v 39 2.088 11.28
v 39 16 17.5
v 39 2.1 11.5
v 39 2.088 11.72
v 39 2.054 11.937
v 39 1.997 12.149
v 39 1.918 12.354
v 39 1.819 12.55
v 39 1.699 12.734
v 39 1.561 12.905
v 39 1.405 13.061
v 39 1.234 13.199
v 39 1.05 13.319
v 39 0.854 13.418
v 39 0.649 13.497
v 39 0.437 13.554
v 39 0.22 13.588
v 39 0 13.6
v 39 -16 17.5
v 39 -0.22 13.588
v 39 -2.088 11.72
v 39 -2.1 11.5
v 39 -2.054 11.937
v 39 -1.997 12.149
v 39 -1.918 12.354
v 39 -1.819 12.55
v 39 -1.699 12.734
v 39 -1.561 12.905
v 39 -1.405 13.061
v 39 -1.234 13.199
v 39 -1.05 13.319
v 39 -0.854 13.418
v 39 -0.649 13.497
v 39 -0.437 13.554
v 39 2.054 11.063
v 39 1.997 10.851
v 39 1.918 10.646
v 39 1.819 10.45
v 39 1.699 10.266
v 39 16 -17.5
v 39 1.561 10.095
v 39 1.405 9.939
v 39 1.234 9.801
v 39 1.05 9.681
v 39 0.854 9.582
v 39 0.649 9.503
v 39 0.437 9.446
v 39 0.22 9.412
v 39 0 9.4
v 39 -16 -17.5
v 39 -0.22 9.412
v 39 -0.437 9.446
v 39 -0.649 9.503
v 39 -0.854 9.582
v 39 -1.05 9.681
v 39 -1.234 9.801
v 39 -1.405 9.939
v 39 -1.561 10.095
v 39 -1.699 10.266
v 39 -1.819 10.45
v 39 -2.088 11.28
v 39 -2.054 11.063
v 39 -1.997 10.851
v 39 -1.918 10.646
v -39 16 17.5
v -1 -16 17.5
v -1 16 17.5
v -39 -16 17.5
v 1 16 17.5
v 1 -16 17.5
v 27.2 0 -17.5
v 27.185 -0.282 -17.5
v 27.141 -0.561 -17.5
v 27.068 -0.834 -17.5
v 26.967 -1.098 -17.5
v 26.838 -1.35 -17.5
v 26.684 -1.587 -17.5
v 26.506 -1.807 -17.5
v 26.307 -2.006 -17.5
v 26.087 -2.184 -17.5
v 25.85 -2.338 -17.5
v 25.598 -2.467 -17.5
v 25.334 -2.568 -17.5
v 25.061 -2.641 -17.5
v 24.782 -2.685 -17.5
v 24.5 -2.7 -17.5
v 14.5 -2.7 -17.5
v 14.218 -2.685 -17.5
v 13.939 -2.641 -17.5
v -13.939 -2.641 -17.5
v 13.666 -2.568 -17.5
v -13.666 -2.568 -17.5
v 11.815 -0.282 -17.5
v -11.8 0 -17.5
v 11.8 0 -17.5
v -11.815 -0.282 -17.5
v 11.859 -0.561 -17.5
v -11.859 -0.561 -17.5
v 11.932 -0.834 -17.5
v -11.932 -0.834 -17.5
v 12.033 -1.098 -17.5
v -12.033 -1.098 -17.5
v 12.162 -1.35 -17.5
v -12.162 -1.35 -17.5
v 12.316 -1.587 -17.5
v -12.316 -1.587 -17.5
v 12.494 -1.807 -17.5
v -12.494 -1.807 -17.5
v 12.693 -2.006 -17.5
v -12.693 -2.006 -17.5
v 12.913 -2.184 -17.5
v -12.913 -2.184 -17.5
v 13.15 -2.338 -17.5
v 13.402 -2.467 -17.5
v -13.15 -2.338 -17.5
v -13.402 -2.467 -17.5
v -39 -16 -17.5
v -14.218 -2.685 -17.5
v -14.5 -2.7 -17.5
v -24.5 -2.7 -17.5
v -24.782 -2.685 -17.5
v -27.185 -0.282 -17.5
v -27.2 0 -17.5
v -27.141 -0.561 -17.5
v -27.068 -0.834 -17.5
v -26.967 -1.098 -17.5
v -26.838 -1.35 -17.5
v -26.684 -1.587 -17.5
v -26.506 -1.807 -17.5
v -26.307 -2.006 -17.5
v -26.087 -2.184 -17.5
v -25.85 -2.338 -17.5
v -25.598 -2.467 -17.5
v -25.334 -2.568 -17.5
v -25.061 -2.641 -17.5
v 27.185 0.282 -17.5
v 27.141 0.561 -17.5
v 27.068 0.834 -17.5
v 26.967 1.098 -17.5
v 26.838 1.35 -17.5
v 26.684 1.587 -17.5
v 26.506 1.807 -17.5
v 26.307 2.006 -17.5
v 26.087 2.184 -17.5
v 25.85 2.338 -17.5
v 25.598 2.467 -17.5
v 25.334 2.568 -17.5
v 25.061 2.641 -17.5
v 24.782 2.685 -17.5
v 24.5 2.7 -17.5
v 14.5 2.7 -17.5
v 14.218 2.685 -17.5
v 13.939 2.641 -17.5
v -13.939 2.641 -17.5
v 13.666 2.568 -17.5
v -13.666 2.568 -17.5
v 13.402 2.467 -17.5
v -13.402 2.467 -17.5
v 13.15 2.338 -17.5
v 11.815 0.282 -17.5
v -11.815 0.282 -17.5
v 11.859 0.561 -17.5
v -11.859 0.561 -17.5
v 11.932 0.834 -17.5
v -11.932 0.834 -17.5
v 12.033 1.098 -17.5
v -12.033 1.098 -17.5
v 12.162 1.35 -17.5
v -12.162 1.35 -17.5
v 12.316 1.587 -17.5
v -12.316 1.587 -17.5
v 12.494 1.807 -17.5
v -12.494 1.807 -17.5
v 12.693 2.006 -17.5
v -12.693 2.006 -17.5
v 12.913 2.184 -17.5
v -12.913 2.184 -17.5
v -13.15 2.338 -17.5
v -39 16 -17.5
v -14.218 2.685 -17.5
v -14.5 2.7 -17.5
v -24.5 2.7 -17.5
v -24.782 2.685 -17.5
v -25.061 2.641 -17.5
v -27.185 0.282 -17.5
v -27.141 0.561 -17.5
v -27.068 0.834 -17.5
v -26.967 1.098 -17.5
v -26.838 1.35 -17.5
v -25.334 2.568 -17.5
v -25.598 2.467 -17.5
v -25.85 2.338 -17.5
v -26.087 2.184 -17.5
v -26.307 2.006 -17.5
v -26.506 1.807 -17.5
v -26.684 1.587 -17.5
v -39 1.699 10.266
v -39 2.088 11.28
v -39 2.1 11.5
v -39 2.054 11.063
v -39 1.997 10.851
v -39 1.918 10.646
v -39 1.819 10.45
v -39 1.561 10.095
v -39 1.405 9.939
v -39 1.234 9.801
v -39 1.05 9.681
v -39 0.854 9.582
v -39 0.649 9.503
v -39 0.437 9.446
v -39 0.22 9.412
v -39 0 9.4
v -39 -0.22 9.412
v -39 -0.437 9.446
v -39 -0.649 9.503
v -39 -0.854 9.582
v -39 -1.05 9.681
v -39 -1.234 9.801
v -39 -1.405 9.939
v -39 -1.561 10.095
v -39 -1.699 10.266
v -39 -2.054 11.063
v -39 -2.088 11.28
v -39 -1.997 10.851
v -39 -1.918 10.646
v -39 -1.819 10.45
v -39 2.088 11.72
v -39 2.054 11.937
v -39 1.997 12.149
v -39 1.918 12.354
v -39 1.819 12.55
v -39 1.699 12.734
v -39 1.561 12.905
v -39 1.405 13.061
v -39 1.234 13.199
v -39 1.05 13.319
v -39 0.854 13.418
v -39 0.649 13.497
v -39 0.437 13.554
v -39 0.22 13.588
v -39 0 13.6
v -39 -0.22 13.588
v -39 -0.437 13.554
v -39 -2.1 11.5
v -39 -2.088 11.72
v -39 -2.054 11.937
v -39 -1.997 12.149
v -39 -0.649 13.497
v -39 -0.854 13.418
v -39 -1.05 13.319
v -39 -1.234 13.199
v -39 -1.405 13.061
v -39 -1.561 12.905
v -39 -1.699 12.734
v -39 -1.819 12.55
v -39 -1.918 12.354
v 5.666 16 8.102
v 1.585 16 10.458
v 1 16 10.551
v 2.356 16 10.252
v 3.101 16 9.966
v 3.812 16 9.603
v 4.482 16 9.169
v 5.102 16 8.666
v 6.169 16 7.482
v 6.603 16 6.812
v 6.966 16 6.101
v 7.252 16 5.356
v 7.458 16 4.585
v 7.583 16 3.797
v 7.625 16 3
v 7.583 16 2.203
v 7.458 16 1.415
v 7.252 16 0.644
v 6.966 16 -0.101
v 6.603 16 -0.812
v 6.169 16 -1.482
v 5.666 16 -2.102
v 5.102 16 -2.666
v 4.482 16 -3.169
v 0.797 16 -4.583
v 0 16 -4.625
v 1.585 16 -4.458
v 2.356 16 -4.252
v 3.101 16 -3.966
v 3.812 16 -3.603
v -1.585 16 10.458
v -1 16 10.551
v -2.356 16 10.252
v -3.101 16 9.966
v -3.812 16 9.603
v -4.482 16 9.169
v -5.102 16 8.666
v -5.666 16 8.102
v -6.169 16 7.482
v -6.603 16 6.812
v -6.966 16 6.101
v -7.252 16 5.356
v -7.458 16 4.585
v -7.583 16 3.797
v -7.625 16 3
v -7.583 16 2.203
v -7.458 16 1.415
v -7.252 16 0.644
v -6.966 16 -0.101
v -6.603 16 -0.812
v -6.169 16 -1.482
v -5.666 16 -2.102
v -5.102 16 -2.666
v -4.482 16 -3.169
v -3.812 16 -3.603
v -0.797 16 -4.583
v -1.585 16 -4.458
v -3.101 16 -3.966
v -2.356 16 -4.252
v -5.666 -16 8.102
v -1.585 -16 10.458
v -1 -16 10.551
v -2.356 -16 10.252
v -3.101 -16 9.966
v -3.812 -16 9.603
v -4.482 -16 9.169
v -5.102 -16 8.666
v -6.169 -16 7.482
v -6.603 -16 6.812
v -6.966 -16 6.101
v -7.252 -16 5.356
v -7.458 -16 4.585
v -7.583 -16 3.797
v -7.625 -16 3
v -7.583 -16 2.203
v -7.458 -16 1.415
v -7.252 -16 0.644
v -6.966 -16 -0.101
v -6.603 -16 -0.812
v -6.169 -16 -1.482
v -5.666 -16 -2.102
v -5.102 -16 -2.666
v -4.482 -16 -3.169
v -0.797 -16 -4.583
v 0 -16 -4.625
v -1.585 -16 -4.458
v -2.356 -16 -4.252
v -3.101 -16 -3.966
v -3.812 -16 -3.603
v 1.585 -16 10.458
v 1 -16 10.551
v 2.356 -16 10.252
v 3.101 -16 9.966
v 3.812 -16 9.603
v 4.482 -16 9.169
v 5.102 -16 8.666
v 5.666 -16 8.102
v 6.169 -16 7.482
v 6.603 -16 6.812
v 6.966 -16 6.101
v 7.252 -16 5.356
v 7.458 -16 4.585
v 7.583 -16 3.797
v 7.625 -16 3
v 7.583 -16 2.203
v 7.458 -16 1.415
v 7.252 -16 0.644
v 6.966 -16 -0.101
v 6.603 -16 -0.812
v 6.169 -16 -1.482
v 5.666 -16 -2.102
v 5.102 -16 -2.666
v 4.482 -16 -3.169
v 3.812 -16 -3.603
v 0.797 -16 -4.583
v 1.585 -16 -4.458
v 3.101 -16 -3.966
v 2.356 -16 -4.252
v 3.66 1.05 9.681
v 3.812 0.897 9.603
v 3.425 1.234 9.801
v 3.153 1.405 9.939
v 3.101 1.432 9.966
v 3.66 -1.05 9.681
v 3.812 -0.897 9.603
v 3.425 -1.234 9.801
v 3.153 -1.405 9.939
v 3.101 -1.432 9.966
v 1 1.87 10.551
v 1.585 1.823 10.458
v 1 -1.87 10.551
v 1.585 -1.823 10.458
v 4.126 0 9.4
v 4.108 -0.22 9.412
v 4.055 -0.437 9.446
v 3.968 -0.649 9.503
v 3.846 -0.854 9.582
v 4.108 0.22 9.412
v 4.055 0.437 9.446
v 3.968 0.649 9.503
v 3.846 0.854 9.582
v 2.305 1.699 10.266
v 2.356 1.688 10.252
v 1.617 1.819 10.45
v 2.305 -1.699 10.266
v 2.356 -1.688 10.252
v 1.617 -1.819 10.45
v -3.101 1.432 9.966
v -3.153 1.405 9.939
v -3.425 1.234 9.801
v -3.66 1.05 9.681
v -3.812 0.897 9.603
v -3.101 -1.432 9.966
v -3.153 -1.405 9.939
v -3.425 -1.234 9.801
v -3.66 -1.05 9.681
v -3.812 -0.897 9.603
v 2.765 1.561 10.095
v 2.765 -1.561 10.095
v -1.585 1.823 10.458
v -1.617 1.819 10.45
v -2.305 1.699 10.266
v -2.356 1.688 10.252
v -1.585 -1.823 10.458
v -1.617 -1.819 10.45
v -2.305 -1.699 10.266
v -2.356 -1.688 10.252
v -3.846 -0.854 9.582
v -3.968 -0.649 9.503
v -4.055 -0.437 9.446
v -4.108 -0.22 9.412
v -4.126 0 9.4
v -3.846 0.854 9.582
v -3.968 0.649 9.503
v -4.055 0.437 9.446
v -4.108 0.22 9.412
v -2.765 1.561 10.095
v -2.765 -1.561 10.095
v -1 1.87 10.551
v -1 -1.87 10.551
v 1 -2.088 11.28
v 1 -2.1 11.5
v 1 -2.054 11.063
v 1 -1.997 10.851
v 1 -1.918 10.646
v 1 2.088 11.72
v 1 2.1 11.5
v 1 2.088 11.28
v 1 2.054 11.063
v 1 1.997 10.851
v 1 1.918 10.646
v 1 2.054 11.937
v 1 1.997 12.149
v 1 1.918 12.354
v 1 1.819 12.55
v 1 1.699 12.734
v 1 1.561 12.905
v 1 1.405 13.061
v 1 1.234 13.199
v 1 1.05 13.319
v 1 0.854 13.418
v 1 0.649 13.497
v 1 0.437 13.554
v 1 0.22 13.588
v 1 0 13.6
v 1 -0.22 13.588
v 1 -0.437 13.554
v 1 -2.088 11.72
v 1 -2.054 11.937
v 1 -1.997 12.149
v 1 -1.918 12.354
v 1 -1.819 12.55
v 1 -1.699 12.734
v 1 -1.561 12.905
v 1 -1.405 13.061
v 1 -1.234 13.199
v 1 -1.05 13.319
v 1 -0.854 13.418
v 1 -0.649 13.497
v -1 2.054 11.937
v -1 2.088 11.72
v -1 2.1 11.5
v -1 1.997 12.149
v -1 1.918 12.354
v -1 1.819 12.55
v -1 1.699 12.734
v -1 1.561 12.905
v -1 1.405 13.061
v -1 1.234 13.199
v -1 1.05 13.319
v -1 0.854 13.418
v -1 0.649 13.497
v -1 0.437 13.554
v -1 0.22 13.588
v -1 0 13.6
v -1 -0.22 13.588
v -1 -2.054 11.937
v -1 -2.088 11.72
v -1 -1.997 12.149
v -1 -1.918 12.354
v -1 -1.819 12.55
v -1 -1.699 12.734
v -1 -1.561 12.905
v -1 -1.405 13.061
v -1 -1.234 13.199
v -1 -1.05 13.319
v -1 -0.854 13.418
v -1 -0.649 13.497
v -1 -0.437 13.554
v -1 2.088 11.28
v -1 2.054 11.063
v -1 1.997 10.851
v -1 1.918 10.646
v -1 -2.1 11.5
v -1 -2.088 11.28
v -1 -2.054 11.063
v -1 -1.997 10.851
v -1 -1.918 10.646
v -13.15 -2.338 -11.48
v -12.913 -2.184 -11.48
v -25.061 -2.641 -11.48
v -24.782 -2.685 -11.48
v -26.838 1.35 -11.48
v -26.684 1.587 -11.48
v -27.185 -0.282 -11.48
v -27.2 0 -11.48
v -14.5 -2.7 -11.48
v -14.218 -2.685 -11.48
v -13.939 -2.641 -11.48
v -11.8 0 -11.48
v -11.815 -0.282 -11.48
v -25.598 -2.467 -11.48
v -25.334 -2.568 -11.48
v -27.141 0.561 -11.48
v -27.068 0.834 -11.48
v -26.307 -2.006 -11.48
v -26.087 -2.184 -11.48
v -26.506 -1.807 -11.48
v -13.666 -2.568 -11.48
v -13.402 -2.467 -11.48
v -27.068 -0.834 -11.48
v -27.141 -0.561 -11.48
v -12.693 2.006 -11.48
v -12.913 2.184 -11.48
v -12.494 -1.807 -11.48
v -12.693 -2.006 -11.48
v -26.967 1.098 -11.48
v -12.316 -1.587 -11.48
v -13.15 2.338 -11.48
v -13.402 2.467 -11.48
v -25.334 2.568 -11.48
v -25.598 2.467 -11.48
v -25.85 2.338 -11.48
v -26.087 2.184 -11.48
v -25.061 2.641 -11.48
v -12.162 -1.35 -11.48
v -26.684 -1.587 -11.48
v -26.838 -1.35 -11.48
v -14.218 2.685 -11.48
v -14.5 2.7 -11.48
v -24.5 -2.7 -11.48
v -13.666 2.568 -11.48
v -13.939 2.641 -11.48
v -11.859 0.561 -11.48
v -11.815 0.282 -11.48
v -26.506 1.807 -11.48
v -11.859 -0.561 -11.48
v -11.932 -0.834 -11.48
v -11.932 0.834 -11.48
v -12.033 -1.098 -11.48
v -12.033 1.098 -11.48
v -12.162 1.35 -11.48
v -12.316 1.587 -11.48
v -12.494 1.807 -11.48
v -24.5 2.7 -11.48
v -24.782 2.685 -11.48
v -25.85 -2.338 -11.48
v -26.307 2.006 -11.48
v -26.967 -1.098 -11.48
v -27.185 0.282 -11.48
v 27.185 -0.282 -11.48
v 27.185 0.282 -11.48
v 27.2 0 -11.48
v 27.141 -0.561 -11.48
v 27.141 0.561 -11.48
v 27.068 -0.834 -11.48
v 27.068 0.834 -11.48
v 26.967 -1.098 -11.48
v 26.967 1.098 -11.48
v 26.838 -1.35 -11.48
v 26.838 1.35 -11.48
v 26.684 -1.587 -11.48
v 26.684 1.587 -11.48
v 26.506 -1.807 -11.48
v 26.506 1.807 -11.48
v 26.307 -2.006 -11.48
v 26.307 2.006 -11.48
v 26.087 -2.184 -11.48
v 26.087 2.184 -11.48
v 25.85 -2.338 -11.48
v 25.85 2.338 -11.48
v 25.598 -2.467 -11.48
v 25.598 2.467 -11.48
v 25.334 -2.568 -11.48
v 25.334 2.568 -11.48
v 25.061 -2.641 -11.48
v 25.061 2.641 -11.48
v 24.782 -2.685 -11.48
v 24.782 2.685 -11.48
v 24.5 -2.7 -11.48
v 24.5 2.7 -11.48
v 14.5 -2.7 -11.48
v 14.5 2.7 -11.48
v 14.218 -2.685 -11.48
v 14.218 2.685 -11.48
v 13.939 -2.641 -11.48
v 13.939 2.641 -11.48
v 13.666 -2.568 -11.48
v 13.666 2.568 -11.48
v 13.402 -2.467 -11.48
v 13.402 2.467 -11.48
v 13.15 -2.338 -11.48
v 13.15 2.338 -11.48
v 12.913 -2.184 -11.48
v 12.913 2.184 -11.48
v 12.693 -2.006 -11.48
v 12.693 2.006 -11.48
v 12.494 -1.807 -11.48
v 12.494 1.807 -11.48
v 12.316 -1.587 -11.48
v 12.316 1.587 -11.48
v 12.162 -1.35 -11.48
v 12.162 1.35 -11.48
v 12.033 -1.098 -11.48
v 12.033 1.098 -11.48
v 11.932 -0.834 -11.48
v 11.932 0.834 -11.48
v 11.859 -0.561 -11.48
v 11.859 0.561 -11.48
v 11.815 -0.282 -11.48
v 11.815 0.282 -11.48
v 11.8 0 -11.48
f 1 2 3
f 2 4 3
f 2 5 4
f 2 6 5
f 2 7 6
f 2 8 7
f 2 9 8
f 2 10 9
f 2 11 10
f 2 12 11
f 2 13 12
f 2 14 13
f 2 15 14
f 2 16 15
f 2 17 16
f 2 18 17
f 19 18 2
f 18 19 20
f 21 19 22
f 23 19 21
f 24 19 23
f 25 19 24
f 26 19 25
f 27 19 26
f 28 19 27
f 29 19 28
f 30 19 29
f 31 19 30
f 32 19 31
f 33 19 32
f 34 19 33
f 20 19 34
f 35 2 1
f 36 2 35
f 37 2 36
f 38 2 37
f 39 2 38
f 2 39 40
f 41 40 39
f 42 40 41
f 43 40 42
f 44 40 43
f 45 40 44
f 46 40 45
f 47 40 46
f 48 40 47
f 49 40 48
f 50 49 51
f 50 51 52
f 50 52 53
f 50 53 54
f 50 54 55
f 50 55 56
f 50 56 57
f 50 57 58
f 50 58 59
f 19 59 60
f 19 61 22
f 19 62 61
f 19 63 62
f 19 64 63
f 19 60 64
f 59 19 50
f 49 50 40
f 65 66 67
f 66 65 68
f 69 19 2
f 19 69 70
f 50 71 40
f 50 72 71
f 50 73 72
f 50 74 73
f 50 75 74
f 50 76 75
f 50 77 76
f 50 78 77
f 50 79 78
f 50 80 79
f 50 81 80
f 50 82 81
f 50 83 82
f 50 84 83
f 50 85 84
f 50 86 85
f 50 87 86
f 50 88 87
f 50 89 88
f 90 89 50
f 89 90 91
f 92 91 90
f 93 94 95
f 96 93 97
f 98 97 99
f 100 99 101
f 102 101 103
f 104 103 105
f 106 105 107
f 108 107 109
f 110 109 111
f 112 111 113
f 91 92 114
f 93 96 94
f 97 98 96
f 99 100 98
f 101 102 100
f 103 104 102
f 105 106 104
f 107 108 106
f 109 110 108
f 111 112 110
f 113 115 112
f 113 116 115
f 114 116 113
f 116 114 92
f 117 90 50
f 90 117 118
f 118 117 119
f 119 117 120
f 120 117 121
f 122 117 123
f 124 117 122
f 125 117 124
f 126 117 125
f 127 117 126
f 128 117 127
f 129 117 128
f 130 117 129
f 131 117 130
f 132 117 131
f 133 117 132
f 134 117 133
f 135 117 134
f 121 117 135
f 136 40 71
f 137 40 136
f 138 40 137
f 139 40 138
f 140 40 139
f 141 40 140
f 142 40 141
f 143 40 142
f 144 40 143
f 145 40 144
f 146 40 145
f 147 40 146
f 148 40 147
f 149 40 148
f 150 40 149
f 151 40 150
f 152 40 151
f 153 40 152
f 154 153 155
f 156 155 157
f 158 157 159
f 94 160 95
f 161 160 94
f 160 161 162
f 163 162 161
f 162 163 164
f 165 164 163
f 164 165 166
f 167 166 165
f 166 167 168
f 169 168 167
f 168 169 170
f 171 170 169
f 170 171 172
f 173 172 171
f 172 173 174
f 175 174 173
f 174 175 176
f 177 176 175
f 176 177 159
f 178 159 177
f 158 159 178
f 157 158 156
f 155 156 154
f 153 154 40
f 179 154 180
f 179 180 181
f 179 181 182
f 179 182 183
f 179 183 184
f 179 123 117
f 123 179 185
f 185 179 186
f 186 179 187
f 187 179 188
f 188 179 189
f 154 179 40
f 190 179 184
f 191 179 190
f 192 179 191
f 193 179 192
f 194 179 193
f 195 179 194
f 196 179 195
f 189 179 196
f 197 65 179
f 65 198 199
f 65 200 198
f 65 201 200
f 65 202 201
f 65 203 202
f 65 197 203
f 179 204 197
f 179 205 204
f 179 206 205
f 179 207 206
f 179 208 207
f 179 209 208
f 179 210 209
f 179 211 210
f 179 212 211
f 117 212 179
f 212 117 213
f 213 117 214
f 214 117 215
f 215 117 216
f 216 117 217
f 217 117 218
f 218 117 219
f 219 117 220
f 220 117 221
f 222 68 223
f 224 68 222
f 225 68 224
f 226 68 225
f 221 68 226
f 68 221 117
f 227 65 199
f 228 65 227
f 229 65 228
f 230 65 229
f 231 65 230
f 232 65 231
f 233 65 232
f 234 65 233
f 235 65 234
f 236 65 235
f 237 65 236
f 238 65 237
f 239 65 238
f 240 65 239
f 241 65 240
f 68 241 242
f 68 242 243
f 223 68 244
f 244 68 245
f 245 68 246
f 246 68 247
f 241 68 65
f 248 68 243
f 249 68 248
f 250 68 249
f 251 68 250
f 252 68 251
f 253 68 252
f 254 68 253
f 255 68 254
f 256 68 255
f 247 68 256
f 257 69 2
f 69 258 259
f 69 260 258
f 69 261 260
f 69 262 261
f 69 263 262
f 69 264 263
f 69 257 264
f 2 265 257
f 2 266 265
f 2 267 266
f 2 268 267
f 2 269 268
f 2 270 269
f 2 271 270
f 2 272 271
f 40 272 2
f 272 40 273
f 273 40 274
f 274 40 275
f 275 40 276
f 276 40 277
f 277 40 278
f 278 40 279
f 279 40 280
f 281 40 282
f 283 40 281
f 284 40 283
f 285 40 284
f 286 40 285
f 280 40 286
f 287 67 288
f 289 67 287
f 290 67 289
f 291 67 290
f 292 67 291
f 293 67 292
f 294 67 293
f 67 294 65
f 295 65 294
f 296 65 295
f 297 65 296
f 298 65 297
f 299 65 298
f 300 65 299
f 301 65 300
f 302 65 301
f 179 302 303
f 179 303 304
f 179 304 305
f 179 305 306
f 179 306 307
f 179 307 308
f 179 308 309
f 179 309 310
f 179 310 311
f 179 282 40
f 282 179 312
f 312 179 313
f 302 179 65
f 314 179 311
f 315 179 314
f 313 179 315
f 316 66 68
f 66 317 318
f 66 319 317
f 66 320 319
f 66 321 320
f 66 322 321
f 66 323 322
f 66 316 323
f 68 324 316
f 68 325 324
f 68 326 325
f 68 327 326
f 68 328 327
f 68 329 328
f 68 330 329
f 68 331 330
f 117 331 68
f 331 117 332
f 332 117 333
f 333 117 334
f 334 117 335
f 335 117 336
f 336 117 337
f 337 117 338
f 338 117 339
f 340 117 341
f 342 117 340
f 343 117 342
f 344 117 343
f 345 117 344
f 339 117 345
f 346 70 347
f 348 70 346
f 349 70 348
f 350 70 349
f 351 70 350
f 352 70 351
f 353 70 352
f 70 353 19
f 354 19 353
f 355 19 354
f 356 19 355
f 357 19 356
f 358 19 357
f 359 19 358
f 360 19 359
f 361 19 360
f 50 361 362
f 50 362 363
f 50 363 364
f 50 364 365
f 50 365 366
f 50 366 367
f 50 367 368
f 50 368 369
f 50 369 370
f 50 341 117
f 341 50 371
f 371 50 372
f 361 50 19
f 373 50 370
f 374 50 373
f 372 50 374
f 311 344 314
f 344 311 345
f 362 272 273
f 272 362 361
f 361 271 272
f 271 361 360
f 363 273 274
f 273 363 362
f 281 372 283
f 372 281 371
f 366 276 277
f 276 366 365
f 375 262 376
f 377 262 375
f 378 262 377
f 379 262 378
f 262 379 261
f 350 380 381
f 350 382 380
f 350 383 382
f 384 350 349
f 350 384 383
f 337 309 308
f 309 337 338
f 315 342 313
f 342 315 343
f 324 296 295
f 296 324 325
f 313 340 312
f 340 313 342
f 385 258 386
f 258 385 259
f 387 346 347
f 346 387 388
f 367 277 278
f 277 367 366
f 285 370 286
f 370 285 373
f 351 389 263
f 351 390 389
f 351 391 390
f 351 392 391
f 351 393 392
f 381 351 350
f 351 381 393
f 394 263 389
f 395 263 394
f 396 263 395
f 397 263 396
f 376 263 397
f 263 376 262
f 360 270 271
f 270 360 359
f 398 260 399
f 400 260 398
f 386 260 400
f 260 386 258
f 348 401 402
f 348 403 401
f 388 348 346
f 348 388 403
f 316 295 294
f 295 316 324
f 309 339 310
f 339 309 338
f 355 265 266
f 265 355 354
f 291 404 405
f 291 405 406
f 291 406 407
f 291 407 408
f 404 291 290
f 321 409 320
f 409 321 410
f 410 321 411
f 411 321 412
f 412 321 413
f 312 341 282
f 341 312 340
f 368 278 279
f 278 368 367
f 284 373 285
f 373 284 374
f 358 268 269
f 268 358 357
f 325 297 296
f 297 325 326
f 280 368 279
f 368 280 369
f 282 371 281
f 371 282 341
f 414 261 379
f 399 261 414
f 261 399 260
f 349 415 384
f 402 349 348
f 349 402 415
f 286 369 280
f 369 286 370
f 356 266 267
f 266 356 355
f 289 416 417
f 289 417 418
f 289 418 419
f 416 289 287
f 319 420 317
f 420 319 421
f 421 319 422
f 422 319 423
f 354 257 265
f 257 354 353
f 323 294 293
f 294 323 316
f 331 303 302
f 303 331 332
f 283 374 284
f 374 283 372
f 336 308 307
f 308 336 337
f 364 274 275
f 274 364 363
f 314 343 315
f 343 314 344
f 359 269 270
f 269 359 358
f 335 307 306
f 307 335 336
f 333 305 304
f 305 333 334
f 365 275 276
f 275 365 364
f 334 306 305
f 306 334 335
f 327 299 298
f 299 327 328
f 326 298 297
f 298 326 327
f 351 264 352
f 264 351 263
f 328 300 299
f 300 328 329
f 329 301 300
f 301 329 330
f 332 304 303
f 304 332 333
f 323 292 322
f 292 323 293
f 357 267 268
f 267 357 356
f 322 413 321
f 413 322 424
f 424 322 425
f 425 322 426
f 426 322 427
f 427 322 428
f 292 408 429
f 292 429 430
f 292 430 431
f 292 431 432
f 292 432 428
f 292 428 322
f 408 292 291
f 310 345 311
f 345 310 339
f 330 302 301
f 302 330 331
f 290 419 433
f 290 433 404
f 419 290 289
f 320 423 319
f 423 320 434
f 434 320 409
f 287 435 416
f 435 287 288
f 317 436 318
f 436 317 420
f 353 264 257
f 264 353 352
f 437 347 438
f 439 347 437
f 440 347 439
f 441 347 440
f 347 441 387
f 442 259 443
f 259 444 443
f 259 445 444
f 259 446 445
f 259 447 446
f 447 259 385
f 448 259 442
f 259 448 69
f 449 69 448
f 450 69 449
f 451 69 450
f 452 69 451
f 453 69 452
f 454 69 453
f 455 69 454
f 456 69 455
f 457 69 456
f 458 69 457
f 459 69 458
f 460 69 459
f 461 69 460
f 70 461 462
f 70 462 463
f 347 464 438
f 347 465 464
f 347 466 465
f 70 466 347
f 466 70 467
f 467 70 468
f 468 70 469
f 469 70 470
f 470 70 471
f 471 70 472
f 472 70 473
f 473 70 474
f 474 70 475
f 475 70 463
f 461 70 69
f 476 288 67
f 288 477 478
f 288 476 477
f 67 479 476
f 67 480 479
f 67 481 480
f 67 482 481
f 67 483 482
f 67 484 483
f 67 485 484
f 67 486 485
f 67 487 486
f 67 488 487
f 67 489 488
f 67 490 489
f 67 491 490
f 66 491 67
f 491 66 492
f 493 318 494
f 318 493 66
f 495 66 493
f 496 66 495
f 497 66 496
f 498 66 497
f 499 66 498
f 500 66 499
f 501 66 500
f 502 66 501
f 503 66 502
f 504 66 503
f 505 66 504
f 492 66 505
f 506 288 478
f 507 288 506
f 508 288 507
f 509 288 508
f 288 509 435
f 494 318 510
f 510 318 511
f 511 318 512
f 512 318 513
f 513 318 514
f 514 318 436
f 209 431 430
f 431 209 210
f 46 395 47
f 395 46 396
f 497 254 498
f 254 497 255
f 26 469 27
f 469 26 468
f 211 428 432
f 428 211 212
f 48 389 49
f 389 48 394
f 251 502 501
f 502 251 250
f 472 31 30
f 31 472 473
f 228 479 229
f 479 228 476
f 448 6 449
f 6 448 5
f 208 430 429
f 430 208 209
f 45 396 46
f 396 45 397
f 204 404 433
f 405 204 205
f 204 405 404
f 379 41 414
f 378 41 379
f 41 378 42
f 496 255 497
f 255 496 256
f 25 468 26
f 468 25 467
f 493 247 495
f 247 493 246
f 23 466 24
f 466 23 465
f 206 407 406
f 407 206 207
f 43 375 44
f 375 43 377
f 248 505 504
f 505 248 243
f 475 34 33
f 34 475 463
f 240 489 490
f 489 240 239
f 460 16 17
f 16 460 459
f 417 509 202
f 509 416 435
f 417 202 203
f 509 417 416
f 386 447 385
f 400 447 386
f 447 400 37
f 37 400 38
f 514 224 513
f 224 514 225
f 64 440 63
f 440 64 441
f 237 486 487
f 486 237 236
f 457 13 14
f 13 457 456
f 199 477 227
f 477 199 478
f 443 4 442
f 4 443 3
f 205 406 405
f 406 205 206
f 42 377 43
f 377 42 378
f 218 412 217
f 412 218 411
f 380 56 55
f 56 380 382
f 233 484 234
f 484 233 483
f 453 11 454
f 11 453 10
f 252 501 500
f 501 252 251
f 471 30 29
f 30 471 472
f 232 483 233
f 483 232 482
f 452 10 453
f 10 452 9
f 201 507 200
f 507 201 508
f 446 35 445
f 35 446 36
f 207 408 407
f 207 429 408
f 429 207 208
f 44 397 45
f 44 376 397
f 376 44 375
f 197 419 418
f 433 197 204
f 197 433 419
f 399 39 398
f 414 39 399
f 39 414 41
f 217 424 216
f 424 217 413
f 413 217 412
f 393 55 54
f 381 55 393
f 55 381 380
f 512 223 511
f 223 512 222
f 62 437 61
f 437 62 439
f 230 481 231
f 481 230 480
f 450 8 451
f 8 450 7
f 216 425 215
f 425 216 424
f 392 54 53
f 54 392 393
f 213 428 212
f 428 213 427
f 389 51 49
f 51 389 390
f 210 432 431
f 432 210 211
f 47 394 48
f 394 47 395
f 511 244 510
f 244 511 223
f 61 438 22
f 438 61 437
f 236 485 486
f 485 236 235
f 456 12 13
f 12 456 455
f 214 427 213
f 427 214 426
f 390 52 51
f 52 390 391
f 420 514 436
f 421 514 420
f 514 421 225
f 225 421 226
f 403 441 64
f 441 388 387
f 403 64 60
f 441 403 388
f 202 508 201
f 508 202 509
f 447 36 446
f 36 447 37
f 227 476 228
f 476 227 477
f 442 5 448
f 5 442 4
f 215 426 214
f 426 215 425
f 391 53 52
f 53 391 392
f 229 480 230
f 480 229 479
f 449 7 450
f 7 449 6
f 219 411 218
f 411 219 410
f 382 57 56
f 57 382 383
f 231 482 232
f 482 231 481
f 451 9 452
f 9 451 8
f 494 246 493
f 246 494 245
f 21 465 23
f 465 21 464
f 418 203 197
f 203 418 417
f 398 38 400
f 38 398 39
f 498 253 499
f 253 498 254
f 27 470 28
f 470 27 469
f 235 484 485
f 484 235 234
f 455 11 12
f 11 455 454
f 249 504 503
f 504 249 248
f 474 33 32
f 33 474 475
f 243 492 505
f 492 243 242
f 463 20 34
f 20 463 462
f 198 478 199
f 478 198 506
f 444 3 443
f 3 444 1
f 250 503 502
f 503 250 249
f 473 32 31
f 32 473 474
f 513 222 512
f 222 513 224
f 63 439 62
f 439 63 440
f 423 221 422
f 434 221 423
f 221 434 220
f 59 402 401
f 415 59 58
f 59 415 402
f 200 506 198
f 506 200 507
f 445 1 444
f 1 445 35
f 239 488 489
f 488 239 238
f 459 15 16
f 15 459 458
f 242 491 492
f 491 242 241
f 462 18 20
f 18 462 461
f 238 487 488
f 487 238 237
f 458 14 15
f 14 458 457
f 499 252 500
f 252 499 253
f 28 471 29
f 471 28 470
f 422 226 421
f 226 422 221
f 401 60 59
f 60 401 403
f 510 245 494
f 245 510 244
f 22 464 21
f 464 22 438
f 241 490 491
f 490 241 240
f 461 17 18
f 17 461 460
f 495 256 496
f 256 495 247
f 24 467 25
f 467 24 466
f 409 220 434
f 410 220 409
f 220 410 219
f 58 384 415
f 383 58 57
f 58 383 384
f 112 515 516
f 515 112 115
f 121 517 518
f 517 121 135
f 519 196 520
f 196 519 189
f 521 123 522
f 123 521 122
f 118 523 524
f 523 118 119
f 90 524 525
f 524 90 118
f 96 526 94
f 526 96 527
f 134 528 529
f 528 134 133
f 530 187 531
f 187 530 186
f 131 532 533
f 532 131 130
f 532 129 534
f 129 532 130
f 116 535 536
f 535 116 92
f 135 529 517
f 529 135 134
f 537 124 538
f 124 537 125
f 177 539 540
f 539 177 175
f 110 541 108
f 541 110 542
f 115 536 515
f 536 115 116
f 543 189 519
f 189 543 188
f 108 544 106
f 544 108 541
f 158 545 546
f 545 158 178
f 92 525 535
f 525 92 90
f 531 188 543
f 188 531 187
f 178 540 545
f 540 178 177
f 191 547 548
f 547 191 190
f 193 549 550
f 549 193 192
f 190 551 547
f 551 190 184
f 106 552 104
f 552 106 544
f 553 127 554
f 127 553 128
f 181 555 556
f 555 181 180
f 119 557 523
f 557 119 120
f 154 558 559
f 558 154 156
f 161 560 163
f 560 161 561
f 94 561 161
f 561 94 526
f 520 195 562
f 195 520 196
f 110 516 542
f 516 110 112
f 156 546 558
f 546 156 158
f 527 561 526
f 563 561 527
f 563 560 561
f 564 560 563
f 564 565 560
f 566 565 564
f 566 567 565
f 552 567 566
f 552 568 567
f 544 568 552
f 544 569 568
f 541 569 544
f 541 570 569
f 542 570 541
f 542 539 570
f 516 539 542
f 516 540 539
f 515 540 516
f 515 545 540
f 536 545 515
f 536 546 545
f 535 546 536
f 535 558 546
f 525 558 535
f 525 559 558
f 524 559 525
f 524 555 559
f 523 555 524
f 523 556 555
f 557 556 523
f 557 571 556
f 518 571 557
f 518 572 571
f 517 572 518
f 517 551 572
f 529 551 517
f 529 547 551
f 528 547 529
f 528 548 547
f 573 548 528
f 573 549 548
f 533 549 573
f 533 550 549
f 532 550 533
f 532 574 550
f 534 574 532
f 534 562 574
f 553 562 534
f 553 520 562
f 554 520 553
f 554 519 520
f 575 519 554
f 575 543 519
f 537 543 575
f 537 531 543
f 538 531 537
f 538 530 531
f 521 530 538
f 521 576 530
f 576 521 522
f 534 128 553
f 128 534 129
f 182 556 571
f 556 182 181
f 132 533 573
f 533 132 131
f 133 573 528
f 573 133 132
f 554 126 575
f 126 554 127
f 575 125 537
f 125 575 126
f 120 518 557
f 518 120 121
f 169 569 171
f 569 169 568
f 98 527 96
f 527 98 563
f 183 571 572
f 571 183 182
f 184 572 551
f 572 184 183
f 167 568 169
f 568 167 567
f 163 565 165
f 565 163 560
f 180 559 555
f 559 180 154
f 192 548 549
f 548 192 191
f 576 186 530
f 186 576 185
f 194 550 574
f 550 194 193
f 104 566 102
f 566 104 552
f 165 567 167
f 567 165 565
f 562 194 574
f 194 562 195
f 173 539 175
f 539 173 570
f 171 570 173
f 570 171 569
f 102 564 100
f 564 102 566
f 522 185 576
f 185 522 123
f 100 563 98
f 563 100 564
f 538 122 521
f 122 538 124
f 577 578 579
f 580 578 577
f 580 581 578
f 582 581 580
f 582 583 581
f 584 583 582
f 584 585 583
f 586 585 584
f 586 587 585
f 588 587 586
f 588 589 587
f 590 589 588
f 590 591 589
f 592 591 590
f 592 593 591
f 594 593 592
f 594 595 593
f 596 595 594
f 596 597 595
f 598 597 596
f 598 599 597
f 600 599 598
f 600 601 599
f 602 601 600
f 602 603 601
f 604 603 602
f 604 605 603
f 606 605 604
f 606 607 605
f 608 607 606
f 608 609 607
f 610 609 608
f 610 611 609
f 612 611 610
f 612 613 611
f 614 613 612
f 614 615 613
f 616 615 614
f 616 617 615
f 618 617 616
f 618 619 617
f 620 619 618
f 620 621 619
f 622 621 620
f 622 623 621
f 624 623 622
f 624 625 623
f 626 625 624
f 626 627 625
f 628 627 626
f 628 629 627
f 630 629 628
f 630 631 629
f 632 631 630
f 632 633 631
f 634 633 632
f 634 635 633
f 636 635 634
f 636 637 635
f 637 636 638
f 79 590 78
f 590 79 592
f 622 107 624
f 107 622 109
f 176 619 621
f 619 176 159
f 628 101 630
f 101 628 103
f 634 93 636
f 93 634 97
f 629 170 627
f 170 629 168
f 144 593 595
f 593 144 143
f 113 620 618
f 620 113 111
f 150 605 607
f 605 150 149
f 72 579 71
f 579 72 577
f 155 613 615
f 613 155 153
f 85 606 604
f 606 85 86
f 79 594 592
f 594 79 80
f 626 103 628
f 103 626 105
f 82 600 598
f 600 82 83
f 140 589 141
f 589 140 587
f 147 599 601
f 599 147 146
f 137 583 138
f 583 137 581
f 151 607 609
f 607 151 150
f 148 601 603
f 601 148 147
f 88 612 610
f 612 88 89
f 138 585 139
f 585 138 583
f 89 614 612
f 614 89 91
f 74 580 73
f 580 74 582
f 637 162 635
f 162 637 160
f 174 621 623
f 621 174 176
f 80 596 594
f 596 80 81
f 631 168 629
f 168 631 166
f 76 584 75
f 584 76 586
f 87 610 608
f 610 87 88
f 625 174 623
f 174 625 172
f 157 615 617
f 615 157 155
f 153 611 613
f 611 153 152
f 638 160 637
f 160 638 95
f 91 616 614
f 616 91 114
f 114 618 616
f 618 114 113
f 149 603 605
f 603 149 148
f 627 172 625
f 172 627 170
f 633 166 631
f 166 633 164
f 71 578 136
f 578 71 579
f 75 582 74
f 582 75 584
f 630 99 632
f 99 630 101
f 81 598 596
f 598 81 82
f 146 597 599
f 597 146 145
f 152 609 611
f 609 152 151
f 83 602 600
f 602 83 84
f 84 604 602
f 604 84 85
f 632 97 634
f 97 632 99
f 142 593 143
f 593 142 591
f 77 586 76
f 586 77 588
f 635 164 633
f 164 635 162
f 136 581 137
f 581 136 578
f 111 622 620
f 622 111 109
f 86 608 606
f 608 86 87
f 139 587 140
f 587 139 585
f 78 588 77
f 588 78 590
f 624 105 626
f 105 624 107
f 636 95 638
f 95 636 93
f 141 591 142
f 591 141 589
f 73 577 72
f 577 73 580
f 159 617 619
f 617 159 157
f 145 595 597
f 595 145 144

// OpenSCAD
// Clamp pedestal for 15 mm shaft.
$fn = 60;
eps = 0.02;
shaft_d = 15;
body_l = 78;
body_d = 32;
body_h = 35;
base_t = 6;
slot_w = 2;
mount_d = 5.4;
module mount_slot(x) {
    hull() {
        translate([x - 5, 0, -body_h / 2 - eps]) cylinder(d = mount_d, h = base_t + 2 * eps);
        translate([x + 5, 0, -body_h / 2 - eps]) cylinder(d = mount_d, h = base_t + 2 * eps);
    }
}
difference() {
    cube([body_l, body_d, body_h], center = true);
    translate([0, -body_d / 2 - eps, 3]) rotate([-90, 0, 0]) cylinder(d = shaft_d + 0.25, h = body_d + 2 * eps);
    translate([-slot_w / 2, -body_d / 2 - eps, 3]) cube([slot_w, body_d + 2 * eps, body_h / 2 + eps]);
    translate([-body_l / 2 - eps, 0, body_h / 2 - 6]) rotate([0, 90, 0]) cylinder(d = 4.2, h = body_l + 2 * eps);
    mount_slot(-body_l / 4);
    mount_slot(body_l / 4);
}
